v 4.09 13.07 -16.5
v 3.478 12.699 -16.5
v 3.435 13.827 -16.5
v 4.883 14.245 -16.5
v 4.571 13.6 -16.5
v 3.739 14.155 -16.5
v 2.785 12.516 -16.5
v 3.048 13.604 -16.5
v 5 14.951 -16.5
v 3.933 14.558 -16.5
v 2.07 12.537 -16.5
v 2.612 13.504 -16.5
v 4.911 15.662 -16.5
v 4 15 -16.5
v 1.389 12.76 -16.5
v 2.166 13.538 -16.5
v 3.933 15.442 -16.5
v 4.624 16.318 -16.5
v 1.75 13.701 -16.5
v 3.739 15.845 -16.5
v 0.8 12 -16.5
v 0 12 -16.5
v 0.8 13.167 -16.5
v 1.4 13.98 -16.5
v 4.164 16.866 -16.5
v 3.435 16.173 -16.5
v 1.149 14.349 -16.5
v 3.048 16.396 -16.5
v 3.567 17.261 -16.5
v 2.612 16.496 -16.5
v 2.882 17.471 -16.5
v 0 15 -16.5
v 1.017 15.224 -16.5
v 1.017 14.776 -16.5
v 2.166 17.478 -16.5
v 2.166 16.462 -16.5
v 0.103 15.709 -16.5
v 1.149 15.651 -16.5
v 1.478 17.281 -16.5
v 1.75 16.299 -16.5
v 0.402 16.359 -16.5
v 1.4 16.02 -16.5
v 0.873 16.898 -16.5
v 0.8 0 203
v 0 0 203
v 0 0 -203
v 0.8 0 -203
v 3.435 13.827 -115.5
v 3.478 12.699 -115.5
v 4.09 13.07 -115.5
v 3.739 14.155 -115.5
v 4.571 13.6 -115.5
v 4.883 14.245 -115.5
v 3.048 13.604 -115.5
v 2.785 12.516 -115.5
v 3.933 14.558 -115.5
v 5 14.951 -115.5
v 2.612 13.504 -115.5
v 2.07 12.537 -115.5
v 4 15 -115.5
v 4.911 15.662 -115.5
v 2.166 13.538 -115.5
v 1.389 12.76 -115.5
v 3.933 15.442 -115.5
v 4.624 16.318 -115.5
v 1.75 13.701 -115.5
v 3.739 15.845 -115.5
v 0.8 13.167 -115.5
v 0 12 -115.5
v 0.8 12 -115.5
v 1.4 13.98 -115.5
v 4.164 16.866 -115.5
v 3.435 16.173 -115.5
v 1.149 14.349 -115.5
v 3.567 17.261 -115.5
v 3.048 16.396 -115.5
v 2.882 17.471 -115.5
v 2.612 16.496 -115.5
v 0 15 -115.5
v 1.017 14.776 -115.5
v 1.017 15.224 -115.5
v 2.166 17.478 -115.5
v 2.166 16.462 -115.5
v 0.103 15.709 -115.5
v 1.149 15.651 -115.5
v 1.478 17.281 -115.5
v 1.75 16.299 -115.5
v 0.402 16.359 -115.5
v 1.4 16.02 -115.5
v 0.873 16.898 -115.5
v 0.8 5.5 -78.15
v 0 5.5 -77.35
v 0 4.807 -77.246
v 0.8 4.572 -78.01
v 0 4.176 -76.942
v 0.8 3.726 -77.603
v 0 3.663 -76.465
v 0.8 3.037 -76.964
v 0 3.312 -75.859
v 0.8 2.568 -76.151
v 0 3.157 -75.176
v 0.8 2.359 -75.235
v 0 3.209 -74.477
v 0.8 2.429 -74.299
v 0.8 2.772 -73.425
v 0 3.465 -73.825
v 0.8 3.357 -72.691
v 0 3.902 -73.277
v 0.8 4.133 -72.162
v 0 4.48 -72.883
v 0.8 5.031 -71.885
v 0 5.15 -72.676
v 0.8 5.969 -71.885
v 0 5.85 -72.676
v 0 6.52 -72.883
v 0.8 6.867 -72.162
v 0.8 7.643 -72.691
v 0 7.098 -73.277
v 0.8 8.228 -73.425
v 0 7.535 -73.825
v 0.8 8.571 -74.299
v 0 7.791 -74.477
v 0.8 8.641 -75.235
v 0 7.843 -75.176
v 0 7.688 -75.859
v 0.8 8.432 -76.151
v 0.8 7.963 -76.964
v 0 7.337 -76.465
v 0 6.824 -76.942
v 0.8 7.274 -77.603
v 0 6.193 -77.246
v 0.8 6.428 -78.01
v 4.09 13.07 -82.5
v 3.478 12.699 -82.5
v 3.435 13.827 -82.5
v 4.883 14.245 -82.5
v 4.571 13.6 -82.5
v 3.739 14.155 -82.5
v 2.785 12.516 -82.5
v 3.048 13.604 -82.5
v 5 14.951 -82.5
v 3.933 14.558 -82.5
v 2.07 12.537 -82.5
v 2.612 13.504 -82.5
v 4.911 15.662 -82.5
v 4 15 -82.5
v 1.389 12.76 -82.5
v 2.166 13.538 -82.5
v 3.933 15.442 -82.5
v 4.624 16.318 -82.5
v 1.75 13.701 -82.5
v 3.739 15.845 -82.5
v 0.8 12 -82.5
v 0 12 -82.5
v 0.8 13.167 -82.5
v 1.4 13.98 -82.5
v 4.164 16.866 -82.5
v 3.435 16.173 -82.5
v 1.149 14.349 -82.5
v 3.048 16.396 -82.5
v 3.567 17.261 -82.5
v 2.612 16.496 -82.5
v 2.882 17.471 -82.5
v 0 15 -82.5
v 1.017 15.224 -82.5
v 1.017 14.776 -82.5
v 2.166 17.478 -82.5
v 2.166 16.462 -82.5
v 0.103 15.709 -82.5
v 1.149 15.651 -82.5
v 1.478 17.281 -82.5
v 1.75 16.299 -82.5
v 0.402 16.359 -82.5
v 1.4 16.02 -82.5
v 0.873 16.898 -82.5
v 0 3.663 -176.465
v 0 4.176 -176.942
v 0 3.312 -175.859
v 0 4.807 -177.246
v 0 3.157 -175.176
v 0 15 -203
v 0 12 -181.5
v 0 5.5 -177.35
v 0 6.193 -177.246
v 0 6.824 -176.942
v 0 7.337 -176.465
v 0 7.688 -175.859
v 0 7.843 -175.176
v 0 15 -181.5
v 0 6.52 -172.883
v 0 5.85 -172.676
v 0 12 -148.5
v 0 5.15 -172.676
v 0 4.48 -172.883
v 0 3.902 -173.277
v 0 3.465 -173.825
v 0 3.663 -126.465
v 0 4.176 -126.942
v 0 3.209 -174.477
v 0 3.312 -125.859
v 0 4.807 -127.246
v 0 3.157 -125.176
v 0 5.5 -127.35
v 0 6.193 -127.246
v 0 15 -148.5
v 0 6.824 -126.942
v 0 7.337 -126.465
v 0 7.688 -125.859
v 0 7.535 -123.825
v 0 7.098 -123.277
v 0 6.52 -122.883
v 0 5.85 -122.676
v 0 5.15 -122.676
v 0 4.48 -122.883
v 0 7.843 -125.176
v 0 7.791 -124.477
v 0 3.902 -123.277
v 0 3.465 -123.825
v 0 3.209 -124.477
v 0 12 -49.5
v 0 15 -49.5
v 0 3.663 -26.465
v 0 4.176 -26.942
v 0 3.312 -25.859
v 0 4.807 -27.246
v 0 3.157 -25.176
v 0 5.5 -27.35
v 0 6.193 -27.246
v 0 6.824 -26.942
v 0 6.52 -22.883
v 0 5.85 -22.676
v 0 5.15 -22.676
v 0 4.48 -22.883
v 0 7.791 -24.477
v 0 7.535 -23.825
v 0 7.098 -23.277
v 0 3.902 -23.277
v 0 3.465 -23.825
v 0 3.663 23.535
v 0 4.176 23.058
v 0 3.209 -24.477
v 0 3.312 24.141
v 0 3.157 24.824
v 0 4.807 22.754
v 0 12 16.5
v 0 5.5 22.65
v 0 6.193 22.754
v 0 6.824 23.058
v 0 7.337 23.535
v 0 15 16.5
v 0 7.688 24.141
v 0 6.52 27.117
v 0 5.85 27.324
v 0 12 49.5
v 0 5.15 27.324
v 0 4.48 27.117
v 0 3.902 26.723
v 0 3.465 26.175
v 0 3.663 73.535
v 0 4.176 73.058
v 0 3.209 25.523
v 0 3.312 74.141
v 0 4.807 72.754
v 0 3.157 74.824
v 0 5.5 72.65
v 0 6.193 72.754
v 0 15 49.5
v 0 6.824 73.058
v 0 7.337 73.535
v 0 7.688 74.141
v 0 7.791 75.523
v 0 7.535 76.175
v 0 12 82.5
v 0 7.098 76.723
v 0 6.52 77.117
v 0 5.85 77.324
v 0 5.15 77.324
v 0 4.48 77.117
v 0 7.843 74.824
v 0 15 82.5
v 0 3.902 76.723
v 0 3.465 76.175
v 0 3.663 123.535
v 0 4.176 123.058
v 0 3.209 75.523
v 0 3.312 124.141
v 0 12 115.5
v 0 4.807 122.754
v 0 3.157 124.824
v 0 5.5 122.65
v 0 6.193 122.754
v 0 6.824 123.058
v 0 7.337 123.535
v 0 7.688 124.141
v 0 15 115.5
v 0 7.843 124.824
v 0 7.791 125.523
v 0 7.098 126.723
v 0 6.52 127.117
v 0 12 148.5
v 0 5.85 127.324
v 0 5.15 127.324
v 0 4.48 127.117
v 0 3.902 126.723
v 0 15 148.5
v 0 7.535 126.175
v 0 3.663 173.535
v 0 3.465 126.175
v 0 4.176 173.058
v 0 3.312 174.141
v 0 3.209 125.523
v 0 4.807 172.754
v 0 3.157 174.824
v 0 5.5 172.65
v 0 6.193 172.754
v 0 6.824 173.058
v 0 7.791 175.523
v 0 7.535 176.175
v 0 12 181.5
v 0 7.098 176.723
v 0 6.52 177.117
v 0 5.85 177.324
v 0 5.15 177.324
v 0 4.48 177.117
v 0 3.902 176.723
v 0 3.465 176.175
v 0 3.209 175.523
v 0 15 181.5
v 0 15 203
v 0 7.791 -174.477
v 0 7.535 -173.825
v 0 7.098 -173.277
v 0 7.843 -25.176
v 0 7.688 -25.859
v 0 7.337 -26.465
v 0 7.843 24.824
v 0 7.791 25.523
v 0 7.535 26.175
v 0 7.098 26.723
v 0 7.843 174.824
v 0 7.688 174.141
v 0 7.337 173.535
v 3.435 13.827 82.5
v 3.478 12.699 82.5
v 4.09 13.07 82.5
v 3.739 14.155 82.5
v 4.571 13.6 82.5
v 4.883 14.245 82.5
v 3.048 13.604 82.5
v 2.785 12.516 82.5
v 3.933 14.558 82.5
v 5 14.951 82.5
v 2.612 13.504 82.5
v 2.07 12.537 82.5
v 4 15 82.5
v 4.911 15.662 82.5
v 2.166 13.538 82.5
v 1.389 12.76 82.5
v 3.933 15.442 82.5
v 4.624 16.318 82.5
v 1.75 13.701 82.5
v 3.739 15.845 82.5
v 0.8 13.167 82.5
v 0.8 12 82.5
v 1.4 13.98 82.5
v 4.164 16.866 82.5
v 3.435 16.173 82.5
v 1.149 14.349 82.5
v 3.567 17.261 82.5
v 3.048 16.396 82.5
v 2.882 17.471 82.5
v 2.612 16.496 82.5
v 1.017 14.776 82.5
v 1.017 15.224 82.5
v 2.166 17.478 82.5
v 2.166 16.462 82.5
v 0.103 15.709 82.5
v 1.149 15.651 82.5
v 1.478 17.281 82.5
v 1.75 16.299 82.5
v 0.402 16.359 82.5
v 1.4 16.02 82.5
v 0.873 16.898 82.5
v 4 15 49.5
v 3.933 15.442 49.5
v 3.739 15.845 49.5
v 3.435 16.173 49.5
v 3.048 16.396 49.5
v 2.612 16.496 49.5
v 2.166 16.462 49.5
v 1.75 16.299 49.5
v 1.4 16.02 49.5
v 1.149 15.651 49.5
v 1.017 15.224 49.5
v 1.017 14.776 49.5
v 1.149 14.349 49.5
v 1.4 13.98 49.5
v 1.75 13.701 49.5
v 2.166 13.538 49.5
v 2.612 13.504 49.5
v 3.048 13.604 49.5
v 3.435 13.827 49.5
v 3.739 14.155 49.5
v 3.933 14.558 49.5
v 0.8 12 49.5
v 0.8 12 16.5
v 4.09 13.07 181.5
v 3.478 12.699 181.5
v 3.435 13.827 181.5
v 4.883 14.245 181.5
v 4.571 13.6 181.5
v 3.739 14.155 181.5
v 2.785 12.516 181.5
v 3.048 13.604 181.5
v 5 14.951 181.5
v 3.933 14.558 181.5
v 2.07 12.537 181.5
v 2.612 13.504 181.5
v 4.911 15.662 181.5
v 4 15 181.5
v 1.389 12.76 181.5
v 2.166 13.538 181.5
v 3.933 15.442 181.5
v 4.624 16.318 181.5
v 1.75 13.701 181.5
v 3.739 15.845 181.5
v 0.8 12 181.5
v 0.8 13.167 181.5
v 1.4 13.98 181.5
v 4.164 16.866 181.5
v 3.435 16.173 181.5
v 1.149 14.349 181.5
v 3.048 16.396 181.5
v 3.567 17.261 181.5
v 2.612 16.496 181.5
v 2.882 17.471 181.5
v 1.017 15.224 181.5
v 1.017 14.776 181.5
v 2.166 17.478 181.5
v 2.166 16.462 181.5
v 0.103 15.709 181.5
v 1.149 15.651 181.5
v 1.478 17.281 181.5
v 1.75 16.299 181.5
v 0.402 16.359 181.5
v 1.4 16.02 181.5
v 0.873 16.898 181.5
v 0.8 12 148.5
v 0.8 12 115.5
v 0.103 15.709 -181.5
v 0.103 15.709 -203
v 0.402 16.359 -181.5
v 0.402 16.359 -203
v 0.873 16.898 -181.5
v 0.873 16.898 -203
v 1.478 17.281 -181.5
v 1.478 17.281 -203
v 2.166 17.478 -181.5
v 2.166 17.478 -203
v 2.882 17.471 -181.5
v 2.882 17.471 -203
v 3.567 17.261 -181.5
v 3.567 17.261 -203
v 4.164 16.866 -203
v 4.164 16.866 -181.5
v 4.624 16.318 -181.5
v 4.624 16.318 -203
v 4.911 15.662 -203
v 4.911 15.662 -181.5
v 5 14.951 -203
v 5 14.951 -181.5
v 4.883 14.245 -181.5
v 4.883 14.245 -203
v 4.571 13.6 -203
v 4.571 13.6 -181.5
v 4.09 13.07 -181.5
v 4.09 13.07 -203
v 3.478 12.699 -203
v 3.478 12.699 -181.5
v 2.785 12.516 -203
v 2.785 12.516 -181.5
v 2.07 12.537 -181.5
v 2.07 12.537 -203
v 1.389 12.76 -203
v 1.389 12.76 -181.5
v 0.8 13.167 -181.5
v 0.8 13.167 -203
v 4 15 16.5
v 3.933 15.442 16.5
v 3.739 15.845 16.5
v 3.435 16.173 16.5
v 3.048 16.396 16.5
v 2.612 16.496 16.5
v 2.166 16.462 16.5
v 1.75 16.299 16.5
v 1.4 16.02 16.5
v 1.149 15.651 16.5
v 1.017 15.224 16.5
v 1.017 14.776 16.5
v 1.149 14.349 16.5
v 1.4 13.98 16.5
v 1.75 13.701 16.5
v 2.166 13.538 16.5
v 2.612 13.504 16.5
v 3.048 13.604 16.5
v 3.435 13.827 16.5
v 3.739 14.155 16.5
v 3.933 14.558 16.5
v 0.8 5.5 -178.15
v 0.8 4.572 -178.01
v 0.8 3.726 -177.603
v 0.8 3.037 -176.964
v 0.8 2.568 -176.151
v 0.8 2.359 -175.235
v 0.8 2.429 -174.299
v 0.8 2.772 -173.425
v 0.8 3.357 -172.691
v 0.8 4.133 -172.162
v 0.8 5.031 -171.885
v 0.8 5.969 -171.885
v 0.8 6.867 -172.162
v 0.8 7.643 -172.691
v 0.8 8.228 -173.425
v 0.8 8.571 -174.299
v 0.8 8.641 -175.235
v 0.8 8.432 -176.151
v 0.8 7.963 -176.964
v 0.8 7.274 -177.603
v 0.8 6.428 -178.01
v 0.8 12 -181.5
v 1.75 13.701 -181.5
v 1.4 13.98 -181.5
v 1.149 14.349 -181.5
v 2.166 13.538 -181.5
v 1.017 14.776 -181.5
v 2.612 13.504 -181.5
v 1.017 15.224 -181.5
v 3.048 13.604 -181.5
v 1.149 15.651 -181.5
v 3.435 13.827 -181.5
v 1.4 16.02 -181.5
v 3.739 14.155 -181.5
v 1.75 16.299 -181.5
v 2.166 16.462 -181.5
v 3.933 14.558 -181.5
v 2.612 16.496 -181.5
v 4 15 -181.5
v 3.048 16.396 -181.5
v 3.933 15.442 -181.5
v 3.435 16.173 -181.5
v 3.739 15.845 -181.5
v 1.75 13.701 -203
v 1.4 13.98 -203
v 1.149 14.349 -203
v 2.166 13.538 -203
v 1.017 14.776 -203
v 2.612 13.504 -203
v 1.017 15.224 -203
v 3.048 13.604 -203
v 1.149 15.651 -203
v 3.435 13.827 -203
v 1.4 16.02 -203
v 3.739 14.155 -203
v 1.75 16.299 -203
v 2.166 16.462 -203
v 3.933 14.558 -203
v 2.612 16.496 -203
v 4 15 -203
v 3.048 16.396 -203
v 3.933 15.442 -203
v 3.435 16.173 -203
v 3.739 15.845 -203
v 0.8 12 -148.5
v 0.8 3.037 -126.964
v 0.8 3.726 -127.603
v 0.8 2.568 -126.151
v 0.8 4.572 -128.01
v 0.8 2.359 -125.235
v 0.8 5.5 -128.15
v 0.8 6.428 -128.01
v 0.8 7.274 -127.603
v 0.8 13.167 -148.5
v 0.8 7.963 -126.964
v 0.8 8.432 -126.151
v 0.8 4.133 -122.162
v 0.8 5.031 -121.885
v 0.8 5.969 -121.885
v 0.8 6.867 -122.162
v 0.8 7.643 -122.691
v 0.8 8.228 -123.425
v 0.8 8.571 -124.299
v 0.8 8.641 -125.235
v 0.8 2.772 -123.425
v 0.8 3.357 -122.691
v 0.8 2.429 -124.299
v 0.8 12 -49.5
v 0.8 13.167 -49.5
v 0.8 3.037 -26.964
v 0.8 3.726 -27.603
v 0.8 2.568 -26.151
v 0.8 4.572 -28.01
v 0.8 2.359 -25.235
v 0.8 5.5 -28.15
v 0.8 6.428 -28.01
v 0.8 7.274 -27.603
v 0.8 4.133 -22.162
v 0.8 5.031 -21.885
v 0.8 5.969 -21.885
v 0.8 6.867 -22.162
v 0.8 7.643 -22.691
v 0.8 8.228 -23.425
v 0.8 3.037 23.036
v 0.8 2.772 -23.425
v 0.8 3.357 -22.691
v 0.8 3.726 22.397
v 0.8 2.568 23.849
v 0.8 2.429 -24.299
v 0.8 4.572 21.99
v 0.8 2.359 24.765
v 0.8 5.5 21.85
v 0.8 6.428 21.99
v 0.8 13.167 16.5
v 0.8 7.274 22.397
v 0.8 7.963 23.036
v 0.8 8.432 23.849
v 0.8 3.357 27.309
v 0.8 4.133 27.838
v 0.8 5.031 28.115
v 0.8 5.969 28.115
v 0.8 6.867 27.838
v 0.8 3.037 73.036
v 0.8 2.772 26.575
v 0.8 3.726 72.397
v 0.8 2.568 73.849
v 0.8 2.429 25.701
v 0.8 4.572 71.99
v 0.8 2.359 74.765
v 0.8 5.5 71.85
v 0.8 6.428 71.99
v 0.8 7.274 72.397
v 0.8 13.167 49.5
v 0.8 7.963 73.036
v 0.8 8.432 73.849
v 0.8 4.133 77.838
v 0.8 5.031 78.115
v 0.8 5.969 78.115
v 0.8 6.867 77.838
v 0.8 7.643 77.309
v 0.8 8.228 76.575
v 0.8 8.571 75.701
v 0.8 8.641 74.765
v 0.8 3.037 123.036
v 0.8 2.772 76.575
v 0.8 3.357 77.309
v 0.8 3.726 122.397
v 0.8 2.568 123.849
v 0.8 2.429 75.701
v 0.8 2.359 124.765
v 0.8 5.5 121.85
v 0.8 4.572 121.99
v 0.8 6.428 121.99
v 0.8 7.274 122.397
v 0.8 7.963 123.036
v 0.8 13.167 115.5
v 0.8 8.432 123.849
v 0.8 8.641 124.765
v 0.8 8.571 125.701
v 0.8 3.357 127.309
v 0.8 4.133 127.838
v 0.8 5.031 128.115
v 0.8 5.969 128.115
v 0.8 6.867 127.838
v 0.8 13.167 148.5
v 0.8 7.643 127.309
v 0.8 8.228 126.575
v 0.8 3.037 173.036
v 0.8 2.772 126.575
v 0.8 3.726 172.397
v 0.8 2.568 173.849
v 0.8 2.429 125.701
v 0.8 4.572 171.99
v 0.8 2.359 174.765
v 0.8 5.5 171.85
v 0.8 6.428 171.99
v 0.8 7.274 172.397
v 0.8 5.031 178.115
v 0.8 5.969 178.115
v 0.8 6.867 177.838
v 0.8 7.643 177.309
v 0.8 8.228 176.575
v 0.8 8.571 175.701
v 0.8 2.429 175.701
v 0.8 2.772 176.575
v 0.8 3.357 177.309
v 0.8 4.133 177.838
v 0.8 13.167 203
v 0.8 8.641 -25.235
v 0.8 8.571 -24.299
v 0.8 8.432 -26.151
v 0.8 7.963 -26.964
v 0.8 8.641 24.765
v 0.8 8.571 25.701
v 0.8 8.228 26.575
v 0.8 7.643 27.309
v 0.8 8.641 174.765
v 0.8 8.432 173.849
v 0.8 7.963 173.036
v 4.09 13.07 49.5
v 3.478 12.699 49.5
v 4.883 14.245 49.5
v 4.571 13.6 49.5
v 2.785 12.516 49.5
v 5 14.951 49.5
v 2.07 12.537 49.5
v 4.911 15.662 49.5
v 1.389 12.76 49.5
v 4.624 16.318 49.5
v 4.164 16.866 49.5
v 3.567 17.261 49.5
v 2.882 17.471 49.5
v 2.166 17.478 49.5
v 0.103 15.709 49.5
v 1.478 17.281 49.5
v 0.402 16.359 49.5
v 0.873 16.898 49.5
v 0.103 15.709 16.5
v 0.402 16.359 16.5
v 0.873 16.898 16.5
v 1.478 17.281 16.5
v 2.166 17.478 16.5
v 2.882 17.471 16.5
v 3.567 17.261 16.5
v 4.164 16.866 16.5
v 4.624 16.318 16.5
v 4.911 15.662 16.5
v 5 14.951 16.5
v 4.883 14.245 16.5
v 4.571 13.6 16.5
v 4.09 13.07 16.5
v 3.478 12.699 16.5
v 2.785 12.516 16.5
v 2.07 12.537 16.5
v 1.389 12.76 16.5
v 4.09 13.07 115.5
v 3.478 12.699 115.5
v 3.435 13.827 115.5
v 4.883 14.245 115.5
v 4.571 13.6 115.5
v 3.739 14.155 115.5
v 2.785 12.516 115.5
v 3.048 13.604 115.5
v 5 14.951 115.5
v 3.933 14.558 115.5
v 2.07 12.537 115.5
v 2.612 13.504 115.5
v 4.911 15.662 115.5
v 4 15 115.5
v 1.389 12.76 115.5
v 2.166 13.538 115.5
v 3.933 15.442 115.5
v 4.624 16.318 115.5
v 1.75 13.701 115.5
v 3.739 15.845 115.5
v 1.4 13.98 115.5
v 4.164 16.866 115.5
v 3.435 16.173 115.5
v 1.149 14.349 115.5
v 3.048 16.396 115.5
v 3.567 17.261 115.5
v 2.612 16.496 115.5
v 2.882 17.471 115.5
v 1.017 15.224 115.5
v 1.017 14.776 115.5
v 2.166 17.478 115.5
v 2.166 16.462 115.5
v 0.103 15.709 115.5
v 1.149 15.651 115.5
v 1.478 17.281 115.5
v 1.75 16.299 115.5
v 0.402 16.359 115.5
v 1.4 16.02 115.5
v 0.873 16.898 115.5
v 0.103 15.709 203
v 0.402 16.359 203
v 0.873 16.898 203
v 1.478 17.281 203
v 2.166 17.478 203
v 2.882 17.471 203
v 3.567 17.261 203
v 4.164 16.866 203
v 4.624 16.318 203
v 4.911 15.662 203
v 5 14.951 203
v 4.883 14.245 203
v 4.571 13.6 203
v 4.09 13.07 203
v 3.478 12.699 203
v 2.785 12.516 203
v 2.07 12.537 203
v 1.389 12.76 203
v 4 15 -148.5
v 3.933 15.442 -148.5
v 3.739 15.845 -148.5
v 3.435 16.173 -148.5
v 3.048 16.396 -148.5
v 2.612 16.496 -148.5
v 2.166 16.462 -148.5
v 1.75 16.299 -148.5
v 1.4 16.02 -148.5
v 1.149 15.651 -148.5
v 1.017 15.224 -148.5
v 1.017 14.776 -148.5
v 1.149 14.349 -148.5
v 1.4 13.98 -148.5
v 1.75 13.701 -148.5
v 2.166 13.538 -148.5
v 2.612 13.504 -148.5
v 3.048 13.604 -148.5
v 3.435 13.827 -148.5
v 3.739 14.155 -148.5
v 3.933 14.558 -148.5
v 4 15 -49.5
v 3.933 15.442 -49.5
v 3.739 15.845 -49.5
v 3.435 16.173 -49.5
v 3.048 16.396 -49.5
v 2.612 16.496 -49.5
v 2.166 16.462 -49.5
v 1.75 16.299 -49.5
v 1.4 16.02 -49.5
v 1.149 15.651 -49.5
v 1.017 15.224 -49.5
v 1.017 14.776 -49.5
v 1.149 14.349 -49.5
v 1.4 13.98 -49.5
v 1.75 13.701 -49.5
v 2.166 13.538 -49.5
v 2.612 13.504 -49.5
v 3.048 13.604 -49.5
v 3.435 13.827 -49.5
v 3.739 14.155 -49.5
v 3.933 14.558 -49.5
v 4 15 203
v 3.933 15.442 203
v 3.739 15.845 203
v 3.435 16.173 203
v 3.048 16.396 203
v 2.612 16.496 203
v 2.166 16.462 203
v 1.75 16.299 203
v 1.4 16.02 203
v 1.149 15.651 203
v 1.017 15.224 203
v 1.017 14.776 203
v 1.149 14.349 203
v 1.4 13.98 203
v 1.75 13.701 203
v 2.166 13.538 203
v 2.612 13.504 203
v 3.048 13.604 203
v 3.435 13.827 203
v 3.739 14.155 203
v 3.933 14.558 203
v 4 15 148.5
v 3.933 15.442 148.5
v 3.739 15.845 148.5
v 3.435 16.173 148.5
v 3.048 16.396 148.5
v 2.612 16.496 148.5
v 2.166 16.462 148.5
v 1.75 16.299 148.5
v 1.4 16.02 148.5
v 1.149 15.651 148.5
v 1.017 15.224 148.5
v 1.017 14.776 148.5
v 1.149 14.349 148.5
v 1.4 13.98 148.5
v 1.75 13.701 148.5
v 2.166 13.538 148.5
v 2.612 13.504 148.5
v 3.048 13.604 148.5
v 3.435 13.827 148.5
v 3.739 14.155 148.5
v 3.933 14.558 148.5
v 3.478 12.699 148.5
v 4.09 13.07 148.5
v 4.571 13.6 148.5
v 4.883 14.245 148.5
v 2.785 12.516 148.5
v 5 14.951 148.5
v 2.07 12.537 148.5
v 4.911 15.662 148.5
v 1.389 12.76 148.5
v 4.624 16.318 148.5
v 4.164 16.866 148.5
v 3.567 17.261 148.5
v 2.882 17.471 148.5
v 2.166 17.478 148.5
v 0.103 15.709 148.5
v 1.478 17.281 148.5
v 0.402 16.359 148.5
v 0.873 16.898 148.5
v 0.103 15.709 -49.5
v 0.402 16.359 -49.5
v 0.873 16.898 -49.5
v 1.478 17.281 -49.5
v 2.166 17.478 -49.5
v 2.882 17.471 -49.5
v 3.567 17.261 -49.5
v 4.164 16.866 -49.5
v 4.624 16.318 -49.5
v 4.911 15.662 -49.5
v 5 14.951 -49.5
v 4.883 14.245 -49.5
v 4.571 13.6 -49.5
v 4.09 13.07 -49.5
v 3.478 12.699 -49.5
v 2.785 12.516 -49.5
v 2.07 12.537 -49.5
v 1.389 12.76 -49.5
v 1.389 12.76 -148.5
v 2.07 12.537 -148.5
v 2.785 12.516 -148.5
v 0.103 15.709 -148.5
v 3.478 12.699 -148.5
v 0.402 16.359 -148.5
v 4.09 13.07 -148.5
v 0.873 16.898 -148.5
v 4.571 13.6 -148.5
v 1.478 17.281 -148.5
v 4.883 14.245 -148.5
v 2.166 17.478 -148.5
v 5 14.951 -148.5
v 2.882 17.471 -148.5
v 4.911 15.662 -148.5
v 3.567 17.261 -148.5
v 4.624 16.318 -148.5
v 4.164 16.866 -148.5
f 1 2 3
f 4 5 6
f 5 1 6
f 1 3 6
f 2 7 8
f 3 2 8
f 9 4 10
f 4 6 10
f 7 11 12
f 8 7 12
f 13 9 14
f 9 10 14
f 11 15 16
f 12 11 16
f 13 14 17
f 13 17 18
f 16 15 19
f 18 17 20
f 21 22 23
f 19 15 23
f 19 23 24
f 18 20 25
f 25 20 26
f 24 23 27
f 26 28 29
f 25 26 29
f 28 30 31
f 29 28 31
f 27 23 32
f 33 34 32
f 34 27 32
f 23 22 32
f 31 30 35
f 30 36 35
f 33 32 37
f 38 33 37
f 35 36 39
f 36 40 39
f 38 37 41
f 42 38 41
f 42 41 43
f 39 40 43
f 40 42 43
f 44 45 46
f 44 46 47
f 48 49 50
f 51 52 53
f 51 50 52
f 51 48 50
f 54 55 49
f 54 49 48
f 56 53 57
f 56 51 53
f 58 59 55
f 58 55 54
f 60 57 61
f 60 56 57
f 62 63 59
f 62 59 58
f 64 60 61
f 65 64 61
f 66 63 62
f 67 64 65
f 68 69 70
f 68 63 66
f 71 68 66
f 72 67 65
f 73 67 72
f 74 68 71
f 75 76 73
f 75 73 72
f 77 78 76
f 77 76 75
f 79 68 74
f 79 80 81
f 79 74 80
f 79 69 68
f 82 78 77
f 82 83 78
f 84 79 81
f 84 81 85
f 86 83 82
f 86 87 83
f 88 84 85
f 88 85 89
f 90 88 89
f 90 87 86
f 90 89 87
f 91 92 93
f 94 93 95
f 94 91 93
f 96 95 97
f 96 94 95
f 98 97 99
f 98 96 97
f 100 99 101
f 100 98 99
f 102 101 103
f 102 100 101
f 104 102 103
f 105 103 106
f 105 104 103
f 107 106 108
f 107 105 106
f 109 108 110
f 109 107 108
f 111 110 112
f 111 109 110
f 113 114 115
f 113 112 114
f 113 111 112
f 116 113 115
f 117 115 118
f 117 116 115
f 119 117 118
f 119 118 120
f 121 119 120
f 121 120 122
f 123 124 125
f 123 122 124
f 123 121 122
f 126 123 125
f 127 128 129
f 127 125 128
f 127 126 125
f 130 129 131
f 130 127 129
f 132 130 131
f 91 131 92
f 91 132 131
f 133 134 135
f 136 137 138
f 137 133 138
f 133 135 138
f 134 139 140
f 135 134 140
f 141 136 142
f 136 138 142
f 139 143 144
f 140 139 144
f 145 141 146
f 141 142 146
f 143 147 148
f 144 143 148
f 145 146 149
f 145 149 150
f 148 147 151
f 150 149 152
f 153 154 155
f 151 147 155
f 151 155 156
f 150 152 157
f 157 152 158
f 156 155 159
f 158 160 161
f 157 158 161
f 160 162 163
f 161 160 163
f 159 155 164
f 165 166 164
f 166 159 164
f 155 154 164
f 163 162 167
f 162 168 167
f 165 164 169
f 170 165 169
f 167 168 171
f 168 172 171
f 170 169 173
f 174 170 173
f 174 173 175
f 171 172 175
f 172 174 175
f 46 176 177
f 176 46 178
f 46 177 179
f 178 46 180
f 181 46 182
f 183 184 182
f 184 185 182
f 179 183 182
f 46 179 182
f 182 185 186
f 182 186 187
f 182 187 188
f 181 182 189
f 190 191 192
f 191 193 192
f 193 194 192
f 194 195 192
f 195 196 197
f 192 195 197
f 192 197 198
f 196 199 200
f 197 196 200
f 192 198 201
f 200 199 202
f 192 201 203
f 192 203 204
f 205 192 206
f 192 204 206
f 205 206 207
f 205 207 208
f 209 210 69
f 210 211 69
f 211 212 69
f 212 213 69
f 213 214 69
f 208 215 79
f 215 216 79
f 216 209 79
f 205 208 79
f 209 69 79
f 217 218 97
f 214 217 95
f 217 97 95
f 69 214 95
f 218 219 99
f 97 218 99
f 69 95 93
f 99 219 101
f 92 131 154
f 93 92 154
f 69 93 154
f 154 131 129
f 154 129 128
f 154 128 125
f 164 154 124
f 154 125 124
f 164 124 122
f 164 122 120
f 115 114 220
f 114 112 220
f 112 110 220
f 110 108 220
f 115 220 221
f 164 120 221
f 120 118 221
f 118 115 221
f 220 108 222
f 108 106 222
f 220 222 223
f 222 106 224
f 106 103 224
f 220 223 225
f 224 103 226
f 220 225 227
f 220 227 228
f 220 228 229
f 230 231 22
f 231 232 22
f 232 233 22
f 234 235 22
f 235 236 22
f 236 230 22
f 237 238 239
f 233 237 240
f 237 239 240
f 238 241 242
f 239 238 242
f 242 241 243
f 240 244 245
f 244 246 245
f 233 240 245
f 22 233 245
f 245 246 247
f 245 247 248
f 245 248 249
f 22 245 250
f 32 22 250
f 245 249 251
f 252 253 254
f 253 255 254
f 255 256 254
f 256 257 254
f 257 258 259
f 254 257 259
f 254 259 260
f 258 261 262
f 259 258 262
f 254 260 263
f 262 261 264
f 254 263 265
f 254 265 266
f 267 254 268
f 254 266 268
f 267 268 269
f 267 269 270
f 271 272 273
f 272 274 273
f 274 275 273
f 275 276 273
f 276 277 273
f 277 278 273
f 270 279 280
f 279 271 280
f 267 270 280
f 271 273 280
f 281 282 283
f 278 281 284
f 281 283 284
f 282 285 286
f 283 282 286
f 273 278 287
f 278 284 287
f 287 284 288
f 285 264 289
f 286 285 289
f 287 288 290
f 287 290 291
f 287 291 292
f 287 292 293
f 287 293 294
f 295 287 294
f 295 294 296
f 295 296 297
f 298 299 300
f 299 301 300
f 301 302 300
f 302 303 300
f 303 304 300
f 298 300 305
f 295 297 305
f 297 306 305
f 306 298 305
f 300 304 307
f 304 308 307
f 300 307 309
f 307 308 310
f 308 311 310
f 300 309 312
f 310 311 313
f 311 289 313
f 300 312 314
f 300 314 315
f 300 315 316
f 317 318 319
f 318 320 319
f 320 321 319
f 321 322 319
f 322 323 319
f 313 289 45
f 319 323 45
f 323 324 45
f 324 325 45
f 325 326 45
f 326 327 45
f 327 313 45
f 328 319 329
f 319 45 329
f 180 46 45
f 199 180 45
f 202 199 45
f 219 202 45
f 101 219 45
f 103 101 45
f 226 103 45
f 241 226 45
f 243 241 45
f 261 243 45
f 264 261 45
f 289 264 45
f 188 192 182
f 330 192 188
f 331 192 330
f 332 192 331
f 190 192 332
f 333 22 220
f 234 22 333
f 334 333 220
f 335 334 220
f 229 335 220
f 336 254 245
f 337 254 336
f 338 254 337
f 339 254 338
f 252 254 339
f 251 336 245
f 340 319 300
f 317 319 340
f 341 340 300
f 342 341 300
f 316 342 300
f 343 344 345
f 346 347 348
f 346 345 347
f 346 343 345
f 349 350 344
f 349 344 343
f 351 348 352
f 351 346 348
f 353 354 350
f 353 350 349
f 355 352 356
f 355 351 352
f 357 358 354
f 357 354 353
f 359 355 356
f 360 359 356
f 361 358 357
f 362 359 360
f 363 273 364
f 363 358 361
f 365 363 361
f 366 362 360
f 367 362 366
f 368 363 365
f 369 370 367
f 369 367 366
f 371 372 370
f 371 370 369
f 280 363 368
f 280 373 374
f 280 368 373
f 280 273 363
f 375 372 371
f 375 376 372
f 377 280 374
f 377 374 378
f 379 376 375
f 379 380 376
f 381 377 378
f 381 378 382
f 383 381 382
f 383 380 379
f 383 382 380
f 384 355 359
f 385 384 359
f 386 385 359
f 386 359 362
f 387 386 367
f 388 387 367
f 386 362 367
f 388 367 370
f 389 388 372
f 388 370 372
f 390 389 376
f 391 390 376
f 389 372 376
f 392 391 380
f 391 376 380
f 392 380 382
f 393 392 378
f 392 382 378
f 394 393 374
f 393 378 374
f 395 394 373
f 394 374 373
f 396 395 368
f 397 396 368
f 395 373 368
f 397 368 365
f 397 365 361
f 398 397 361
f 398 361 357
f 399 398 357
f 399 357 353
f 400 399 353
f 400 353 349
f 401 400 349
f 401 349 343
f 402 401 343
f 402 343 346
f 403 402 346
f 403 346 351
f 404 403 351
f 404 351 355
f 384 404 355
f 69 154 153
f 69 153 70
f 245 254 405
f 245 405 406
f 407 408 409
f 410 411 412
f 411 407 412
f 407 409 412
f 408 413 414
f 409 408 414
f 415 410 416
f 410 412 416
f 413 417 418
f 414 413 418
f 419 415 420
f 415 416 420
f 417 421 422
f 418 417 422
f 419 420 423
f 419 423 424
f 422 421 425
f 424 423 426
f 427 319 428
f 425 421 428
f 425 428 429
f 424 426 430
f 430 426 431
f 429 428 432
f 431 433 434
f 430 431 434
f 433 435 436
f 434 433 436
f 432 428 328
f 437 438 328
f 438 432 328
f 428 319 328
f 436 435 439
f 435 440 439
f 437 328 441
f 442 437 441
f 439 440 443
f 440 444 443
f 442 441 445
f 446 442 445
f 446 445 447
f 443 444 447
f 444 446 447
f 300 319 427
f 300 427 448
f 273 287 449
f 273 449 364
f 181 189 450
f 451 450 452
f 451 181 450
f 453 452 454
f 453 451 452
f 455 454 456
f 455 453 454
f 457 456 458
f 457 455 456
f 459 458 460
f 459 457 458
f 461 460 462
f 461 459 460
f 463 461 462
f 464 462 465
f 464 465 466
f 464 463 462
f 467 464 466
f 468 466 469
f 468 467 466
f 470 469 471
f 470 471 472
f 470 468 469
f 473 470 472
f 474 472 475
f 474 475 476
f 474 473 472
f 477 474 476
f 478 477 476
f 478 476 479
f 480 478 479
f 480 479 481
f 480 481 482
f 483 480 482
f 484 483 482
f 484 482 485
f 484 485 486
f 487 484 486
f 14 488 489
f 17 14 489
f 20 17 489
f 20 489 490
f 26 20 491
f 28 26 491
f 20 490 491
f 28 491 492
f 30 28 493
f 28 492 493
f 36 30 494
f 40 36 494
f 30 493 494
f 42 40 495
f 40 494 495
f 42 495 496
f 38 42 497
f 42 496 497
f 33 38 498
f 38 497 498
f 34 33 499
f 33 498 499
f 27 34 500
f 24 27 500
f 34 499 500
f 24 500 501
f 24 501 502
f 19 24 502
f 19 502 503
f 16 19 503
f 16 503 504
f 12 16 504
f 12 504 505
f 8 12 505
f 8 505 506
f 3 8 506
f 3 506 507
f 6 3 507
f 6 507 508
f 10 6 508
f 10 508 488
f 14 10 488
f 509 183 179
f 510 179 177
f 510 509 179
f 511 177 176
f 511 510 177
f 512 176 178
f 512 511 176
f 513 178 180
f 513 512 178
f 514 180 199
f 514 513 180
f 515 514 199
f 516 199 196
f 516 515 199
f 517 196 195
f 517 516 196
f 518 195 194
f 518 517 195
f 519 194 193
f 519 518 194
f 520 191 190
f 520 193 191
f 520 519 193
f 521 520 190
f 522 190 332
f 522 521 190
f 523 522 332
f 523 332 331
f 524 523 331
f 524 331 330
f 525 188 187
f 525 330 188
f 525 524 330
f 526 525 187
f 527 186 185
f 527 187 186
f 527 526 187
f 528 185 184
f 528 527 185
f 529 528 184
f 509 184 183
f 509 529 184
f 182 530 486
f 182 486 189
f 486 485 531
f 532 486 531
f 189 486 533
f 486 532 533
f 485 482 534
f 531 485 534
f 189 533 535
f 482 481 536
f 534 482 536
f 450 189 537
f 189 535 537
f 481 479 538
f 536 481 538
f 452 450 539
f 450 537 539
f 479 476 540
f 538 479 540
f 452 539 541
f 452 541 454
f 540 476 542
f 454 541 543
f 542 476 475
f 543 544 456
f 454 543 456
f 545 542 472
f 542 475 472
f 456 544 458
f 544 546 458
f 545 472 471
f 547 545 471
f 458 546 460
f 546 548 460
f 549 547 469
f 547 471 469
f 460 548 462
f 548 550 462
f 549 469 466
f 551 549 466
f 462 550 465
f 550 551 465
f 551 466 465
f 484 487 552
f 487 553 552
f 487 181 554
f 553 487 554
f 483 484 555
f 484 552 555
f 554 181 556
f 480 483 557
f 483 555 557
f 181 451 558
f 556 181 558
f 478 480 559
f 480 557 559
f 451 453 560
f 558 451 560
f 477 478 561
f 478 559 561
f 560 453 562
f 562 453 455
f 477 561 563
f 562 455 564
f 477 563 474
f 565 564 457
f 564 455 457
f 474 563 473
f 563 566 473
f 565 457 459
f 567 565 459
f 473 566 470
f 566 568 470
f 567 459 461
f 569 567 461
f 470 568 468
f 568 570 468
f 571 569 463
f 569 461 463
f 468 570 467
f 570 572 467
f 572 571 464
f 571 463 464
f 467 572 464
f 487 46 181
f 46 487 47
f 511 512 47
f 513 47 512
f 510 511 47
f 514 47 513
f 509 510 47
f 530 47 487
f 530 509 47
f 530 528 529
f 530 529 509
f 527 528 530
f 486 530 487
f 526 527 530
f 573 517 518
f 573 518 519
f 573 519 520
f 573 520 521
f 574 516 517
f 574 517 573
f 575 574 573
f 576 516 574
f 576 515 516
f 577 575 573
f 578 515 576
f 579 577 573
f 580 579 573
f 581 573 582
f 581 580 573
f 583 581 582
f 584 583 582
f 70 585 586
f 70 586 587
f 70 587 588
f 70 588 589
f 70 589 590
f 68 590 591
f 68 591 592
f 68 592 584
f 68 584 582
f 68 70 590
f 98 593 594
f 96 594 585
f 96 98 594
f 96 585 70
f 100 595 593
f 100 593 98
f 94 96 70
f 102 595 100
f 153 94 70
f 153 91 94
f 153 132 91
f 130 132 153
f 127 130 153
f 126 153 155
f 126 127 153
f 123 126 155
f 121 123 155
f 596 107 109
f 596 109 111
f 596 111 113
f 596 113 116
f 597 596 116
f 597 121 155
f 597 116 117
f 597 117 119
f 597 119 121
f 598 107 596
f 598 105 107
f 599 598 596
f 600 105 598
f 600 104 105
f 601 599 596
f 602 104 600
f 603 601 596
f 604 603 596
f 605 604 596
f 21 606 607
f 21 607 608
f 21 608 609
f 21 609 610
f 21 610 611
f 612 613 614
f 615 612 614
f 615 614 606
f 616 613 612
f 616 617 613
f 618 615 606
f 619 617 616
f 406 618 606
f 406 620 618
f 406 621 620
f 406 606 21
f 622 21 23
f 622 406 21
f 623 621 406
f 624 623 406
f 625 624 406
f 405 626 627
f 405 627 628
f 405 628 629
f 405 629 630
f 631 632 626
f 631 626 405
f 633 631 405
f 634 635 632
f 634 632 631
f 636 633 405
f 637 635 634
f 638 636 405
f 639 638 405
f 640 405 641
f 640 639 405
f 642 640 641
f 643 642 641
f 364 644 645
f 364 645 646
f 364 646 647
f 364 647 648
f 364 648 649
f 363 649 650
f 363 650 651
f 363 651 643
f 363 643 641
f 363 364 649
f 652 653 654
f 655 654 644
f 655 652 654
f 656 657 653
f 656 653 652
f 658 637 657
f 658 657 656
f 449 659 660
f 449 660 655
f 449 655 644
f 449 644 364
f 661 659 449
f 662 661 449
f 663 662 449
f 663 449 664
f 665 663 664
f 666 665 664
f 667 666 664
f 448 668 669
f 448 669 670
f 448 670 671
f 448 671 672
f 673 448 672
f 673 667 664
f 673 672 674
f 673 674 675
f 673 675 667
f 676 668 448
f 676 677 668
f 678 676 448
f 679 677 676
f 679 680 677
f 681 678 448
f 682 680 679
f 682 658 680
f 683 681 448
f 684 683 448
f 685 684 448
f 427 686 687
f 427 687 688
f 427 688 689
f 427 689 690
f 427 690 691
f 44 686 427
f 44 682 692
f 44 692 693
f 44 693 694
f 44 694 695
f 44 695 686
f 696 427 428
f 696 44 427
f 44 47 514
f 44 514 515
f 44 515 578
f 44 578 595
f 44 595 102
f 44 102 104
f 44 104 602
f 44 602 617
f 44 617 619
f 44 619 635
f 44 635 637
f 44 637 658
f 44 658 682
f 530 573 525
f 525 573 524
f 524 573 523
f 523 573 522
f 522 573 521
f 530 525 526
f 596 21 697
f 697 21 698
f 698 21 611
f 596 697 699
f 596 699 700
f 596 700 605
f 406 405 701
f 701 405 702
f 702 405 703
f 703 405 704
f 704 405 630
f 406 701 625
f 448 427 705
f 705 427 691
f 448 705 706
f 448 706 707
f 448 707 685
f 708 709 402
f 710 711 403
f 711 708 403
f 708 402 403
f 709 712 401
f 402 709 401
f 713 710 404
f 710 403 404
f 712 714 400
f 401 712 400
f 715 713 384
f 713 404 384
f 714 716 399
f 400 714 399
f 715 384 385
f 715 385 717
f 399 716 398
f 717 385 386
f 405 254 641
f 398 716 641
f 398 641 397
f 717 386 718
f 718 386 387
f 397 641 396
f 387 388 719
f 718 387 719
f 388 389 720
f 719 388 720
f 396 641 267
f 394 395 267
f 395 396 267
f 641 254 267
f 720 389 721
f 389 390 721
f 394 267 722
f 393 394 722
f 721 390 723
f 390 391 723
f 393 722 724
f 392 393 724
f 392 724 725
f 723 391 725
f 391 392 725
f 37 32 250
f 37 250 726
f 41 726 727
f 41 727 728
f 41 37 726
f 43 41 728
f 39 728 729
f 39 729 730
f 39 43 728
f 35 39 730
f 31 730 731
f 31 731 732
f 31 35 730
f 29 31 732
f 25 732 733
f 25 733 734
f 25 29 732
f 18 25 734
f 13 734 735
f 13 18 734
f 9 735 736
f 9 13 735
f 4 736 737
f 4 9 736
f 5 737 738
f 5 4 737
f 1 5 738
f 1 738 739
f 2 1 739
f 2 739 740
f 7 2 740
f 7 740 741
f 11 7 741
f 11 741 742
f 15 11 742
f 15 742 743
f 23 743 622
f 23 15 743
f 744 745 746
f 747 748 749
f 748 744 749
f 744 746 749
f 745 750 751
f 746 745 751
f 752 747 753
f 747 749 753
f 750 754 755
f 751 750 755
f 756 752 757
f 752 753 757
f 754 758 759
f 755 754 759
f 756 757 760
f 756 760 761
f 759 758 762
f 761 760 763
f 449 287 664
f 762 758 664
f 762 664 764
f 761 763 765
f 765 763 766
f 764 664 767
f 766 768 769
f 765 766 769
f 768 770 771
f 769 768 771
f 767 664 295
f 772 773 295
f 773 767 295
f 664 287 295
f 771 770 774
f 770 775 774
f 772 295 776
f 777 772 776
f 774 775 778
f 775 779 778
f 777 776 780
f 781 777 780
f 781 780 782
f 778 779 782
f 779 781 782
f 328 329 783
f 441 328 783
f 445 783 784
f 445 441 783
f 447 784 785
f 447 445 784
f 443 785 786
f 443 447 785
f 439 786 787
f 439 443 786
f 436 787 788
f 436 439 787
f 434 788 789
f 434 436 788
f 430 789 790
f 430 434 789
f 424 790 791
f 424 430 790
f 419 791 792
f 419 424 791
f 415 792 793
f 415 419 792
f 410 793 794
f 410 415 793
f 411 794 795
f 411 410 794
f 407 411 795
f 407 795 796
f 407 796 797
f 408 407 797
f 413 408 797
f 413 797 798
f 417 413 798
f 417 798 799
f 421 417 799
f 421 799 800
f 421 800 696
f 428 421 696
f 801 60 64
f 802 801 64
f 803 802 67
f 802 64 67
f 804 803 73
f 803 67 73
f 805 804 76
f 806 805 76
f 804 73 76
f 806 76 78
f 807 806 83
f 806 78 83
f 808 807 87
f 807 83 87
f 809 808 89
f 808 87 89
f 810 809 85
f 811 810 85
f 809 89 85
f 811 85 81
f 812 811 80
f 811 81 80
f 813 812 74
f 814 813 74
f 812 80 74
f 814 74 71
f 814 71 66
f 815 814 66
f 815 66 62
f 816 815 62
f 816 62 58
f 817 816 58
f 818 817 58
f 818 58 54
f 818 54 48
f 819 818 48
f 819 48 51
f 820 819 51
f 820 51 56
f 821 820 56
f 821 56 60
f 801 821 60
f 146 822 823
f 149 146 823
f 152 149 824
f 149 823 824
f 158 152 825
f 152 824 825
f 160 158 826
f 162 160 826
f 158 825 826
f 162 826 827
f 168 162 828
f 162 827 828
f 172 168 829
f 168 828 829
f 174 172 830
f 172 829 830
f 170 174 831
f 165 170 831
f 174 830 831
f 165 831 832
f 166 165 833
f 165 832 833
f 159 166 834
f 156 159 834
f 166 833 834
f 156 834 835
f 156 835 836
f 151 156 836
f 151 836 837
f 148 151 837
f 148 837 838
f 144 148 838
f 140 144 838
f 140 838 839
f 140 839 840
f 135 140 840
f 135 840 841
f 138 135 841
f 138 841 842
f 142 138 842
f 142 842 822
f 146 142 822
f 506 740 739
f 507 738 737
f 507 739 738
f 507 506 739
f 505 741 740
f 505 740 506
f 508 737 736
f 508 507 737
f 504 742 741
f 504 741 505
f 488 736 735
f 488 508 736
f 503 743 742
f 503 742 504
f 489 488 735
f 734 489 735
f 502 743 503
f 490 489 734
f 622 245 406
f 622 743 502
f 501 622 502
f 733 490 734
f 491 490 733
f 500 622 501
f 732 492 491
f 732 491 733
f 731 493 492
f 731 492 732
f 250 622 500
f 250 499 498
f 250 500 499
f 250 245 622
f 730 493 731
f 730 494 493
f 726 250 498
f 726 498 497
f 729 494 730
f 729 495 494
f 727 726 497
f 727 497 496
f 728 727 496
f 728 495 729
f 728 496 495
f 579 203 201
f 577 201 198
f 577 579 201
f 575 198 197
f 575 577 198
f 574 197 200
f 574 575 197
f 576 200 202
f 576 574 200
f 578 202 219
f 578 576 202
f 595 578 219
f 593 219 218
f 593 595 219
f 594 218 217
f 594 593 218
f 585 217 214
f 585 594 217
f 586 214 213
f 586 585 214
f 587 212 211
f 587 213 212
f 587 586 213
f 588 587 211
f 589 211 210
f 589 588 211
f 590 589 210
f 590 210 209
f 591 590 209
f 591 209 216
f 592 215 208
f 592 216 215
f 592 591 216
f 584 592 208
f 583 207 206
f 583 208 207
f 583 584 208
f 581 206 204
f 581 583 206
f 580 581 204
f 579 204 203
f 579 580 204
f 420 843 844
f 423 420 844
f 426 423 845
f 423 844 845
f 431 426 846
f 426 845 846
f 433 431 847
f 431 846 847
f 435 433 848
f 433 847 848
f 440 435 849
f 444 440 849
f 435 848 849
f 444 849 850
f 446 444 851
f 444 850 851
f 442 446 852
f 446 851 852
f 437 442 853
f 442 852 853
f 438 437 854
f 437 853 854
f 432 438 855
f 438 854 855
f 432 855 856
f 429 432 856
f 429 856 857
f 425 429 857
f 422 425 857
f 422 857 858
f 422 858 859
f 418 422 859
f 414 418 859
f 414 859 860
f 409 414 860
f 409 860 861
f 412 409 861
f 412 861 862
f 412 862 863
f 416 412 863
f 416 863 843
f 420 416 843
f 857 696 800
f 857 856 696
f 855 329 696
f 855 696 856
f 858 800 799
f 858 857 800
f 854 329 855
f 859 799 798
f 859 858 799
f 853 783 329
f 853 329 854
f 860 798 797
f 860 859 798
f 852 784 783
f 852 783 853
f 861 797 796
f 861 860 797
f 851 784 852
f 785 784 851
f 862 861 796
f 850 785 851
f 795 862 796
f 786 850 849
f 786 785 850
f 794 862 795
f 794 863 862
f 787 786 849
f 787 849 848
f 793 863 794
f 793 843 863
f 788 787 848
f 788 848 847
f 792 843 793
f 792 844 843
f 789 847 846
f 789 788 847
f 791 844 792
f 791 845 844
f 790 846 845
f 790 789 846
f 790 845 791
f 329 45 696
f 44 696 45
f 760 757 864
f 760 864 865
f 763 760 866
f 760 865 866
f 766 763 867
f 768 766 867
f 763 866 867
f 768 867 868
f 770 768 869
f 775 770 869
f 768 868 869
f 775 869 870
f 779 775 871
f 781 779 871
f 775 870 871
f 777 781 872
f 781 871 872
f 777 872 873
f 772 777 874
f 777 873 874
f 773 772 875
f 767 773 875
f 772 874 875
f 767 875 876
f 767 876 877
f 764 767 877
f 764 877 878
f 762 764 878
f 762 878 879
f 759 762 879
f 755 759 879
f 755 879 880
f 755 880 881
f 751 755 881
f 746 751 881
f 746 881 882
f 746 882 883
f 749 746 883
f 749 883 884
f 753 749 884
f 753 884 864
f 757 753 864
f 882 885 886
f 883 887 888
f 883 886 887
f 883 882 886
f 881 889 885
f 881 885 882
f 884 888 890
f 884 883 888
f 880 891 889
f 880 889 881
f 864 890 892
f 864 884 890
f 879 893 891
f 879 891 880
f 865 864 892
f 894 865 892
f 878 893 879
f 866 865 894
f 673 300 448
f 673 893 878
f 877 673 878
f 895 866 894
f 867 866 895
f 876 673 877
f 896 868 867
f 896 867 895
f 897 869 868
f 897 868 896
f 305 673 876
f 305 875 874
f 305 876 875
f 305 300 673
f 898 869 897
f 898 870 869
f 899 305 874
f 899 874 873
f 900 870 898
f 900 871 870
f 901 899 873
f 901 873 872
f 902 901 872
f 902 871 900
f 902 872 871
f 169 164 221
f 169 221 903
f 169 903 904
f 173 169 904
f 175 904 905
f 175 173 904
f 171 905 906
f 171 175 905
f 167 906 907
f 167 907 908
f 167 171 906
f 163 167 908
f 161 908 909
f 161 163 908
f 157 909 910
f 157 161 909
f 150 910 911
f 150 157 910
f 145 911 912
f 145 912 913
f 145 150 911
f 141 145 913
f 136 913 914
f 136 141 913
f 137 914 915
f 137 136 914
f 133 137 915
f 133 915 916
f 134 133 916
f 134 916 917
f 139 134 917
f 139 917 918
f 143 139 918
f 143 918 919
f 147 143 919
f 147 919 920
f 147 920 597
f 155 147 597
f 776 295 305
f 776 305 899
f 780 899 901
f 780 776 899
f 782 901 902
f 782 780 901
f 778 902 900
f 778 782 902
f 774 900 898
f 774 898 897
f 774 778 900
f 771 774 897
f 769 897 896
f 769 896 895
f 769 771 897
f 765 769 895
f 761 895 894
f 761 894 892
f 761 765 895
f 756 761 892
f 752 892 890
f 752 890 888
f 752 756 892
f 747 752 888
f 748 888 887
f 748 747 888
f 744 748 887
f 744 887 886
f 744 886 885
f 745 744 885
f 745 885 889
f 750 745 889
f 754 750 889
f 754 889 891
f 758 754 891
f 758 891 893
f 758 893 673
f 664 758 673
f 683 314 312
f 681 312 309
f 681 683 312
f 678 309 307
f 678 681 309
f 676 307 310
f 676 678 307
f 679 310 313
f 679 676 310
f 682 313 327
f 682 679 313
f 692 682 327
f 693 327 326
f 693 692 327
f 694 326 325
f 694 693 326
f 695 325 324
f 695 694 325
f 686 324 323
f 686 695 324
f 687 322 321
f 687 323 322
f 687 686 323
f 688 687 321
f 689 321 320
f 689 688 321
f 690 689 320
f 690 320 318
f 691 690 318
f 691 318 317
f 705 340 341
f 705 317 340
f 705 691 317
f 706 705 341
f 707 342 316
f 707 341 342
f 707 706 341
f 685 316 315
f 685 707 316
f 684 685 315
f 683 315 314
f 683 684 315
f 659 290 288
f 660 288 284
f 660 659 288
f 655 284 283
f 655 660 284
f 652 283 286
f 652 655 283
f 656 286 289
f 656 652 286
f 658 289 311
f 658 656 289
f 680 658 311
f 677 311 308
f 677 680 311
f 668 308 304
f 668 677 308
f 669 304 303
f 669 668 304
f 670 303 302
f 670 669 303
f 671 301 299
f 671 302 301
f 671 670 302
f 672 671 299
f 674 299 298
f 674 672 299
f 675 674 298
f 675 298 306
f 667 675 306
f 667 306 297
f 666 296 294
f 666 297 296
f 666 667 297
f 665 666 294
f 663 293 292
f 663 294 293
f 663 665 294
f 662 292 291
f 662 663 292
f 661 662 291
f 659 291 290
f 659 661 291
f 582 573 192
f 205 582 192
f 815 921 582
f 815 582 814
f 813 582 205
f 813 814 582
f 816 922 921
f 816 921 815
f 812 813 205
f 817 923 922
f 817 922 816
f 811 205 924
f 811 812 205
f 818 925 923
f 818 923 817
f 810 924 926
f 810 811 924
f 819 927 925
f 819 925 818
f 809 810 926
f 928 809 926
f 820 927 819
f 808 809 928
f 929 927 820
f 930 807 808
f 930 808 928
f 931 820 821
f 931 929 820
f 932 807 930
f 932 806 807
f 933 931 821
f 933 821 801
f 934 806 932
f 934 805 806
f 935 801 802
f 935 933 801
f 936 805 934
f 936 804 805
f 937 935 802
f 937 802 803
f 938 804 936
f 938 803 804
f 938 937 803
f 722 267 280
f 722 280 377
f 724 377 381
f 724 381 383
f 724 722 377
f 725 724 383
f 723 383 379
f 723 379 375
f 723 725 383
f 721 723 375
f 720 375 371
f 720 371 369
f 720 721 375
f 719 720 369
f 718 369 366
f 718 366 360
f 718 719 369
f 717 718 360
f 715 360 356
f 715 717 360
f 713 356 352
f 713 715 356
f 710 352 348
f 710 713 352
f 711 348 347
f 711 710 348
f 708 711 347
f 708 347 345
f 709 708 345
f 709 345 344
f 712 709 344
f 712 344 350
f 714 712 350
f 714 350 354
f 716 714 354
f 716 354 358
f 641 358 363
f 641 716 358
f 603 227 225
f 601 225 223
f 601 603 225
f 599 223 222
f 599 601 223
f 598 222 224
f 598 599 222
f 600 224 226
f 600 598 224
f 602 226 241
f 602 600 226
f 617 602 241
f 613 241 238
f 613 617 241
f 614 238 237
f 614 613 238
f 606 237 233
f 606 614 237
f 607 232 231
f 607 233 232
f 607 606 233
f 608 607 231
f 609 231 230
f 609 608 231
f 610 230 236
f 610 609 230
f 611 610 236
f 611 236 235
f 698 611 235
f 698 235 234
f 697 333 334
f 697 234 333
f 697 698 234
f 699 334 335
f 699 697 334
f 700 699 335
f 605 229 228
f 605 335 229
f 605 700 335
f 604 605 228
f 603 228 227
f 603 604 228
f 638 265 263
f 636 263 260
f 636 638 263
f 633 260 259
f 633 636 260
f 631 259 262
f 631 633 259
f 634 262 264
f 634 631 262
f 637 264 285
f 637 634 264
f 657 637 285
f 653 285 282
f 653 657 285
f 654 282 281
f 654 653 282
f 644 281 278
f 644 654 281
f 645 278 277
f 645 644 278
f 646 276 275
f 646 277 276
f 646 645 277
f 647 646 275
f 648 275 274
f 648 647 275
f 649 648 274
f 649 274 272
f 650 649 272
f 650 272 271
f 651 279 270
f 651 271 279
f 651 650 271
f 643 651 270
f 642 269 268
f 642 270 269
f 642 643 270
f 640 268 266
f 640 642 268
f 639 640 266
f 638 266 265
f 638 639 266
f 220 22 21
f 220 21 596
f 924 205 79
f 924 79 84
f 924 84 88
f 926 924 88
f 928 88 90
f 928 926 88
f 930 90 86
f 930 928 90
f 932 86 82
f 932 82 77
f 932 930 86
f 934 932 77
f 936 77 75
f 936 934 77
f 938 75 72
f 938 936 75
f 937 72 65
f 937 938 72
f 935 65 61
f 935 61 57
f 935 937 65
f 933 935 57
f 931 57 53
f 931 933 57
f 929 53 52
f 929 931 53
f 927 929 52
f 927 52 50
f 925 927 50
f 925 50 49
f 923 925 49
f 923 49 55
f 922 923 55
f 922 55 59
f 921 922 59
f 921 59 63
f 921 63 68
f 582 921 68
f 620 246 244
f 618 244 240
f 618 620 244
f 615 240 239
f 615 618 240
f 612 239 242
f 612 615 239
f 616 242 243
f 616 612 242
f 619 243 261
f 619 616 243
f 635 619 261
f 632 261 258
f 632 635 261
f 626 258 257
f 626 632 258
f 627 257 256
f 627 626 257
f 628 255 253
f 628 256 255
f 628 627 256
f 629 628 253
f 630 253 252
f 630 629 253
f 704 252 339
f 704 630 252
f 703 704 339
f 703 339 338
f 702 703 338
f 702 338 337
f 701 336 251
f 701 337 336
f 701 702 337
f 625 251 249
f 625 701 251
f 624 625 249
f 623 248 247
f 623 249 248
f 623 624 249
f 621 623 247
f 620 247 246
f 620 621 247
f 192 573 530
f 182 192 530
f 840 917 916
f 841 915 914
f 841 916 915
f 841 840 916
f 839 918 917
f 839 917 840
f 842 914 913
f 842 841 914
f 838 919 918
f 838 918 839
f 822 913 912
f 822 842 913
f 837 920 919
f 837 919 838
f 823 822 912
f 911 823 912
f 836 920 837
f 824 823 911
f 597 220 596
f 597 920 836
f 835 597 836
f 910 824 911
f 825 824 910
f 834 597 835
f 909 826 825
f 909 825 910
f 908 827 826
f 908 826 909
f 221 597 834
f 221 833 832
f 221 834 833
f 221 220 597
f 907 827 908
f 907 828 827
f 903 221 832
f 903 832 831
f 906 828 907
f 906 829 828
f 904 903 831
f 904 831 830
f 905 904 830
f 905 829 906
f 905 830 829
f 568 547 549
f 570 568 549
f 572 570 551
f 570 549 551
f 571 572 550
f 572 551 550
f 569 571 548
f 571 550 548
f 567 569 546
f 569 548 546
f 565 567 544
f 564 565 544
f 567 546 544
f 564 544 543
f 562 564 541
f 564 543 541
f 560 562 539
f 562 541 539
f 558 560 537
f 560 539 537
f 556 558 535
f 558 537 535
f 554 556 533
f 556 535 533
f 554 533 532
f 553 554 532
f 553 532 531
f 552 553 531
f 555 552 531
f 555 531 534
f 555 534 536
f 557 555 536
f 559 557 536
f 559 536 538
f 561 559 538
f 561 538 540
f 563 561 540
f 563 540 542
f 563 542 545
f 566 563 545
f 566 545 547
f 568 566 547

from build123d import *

# Parameters (mm, degrees)
SKETCH_1_W             = 0.8
SKETCH_1_H             = 15
EXTRUDE_1_DEPTH        = 203
SKETCH_2_R             = 2.5
SKETCH_3_R             = 1.5
CUT_EXTRUDE_1_DEPTH    = 407.407738607
SKETCH_10_W            = 33
SKETCH_10_H            = 6
CUT_EXTRUDE_4_DEPTH    = 60
PATTERN_LINEAR_1_COUNT = 8
PATTERN_LINEAR_1_PITCH = 50


with BuildPart() as part:
    # 草图1 → 拉伸-薄壁1 (new, symmetric)
    with BuildSketch(Plane.XY):
        with Locations((0.4, 7.5)):
            Rectangle(SKETCH_1_W, SKETCH_1_H)
    extrude(amount=EXTRUDE_1_DEPTH, both=True)

    # 扫描1: sweep along a curve in space
    with BuildLine() as sweep_1_path:
        Line((0.8, 15, 203), (0.8, 15, -203))
    # 草图2 → 扫描1 (sweep)
    with BuildSketch(Plane.XY.offset(203)):
        with Locations((2.5, 15)):
            Circle(SKETCH_2_R)
    sweep(path=sweep_1_path.line)

    # 草图3 → 切除-拉伸1 (cut, through all)
    with BuildSketch(Plane.XY.offset(203)):
        with Locations((2.5, 15)):
            Circle(SKETCH_3_R)
    extrude(amount=-CUT_EXTRUDE_1_DEPTH, mode=Mode.SUBTRACT)

    # 草图10 → 切除-拉伸4 (cut, symmetric)
    with BuildSketch(Plane(origin=(0.8, 0, 0), x_dir=(0, 0, -1), z_dir=(1, 0, 0))):
        with Locations((-165, 15)):
            Rectangle(SKETCH_10_W, SKETCH_10_H)
        with Locations((-99, 15)):
            Rectangle(SKETCH_10_W, SKETCH_10_H)
        with Locations((-33, 15)):
            Rectangle(SKETCH_10_W, SKETCH_10_H)
        with Locations((33, 15)):
            Rectangle(SKETCH_10_W, SKETCH_10_H)
        with Locations((99, 15)):
            Rectangle(SKETCH_10_W, SKETCH_10_H)
        with Locations((165, 15)):
            Rectangle(SKETCH_10_W, SKETCH_10_H)
    extrude(amount=CUT_EXTRUDE_4_DEPTH, both=True, mode=Mode.SUBTRACT)

    # 草图12 → M3 锥坑平头螺钉的锥形沉头孔2 (revolve, cut)
    with BuildSketch(Plane(origin=(0.8, 5.5, -175), x_dir=(0, 0, -1), z_dir=(0, 1, 0))):
        Polygon((0, 0), (0, 0.8), (1.7, 0.8), (1.7, 1.45), (3.15, 0), align=None)
    hole_wizard_m3_2 = revolve(axis=Axis((7.15, 5.5, -175), (-1, 0, 0)), mode=Mode.SUBTRACT)

    # 阵列(线性)1: M3 锥坑平头螺钉的锥形沉头孔2 ×8
    with Locations(*[(0, 0, i * PATTERN_LINEAR_1_PITCH) for i in range(1, PATTERN_LINEAR_1_COUNT)]):
        add(hole_wizard_m3_2, mode=Mode.SUBTRACT)


solid = part.part
